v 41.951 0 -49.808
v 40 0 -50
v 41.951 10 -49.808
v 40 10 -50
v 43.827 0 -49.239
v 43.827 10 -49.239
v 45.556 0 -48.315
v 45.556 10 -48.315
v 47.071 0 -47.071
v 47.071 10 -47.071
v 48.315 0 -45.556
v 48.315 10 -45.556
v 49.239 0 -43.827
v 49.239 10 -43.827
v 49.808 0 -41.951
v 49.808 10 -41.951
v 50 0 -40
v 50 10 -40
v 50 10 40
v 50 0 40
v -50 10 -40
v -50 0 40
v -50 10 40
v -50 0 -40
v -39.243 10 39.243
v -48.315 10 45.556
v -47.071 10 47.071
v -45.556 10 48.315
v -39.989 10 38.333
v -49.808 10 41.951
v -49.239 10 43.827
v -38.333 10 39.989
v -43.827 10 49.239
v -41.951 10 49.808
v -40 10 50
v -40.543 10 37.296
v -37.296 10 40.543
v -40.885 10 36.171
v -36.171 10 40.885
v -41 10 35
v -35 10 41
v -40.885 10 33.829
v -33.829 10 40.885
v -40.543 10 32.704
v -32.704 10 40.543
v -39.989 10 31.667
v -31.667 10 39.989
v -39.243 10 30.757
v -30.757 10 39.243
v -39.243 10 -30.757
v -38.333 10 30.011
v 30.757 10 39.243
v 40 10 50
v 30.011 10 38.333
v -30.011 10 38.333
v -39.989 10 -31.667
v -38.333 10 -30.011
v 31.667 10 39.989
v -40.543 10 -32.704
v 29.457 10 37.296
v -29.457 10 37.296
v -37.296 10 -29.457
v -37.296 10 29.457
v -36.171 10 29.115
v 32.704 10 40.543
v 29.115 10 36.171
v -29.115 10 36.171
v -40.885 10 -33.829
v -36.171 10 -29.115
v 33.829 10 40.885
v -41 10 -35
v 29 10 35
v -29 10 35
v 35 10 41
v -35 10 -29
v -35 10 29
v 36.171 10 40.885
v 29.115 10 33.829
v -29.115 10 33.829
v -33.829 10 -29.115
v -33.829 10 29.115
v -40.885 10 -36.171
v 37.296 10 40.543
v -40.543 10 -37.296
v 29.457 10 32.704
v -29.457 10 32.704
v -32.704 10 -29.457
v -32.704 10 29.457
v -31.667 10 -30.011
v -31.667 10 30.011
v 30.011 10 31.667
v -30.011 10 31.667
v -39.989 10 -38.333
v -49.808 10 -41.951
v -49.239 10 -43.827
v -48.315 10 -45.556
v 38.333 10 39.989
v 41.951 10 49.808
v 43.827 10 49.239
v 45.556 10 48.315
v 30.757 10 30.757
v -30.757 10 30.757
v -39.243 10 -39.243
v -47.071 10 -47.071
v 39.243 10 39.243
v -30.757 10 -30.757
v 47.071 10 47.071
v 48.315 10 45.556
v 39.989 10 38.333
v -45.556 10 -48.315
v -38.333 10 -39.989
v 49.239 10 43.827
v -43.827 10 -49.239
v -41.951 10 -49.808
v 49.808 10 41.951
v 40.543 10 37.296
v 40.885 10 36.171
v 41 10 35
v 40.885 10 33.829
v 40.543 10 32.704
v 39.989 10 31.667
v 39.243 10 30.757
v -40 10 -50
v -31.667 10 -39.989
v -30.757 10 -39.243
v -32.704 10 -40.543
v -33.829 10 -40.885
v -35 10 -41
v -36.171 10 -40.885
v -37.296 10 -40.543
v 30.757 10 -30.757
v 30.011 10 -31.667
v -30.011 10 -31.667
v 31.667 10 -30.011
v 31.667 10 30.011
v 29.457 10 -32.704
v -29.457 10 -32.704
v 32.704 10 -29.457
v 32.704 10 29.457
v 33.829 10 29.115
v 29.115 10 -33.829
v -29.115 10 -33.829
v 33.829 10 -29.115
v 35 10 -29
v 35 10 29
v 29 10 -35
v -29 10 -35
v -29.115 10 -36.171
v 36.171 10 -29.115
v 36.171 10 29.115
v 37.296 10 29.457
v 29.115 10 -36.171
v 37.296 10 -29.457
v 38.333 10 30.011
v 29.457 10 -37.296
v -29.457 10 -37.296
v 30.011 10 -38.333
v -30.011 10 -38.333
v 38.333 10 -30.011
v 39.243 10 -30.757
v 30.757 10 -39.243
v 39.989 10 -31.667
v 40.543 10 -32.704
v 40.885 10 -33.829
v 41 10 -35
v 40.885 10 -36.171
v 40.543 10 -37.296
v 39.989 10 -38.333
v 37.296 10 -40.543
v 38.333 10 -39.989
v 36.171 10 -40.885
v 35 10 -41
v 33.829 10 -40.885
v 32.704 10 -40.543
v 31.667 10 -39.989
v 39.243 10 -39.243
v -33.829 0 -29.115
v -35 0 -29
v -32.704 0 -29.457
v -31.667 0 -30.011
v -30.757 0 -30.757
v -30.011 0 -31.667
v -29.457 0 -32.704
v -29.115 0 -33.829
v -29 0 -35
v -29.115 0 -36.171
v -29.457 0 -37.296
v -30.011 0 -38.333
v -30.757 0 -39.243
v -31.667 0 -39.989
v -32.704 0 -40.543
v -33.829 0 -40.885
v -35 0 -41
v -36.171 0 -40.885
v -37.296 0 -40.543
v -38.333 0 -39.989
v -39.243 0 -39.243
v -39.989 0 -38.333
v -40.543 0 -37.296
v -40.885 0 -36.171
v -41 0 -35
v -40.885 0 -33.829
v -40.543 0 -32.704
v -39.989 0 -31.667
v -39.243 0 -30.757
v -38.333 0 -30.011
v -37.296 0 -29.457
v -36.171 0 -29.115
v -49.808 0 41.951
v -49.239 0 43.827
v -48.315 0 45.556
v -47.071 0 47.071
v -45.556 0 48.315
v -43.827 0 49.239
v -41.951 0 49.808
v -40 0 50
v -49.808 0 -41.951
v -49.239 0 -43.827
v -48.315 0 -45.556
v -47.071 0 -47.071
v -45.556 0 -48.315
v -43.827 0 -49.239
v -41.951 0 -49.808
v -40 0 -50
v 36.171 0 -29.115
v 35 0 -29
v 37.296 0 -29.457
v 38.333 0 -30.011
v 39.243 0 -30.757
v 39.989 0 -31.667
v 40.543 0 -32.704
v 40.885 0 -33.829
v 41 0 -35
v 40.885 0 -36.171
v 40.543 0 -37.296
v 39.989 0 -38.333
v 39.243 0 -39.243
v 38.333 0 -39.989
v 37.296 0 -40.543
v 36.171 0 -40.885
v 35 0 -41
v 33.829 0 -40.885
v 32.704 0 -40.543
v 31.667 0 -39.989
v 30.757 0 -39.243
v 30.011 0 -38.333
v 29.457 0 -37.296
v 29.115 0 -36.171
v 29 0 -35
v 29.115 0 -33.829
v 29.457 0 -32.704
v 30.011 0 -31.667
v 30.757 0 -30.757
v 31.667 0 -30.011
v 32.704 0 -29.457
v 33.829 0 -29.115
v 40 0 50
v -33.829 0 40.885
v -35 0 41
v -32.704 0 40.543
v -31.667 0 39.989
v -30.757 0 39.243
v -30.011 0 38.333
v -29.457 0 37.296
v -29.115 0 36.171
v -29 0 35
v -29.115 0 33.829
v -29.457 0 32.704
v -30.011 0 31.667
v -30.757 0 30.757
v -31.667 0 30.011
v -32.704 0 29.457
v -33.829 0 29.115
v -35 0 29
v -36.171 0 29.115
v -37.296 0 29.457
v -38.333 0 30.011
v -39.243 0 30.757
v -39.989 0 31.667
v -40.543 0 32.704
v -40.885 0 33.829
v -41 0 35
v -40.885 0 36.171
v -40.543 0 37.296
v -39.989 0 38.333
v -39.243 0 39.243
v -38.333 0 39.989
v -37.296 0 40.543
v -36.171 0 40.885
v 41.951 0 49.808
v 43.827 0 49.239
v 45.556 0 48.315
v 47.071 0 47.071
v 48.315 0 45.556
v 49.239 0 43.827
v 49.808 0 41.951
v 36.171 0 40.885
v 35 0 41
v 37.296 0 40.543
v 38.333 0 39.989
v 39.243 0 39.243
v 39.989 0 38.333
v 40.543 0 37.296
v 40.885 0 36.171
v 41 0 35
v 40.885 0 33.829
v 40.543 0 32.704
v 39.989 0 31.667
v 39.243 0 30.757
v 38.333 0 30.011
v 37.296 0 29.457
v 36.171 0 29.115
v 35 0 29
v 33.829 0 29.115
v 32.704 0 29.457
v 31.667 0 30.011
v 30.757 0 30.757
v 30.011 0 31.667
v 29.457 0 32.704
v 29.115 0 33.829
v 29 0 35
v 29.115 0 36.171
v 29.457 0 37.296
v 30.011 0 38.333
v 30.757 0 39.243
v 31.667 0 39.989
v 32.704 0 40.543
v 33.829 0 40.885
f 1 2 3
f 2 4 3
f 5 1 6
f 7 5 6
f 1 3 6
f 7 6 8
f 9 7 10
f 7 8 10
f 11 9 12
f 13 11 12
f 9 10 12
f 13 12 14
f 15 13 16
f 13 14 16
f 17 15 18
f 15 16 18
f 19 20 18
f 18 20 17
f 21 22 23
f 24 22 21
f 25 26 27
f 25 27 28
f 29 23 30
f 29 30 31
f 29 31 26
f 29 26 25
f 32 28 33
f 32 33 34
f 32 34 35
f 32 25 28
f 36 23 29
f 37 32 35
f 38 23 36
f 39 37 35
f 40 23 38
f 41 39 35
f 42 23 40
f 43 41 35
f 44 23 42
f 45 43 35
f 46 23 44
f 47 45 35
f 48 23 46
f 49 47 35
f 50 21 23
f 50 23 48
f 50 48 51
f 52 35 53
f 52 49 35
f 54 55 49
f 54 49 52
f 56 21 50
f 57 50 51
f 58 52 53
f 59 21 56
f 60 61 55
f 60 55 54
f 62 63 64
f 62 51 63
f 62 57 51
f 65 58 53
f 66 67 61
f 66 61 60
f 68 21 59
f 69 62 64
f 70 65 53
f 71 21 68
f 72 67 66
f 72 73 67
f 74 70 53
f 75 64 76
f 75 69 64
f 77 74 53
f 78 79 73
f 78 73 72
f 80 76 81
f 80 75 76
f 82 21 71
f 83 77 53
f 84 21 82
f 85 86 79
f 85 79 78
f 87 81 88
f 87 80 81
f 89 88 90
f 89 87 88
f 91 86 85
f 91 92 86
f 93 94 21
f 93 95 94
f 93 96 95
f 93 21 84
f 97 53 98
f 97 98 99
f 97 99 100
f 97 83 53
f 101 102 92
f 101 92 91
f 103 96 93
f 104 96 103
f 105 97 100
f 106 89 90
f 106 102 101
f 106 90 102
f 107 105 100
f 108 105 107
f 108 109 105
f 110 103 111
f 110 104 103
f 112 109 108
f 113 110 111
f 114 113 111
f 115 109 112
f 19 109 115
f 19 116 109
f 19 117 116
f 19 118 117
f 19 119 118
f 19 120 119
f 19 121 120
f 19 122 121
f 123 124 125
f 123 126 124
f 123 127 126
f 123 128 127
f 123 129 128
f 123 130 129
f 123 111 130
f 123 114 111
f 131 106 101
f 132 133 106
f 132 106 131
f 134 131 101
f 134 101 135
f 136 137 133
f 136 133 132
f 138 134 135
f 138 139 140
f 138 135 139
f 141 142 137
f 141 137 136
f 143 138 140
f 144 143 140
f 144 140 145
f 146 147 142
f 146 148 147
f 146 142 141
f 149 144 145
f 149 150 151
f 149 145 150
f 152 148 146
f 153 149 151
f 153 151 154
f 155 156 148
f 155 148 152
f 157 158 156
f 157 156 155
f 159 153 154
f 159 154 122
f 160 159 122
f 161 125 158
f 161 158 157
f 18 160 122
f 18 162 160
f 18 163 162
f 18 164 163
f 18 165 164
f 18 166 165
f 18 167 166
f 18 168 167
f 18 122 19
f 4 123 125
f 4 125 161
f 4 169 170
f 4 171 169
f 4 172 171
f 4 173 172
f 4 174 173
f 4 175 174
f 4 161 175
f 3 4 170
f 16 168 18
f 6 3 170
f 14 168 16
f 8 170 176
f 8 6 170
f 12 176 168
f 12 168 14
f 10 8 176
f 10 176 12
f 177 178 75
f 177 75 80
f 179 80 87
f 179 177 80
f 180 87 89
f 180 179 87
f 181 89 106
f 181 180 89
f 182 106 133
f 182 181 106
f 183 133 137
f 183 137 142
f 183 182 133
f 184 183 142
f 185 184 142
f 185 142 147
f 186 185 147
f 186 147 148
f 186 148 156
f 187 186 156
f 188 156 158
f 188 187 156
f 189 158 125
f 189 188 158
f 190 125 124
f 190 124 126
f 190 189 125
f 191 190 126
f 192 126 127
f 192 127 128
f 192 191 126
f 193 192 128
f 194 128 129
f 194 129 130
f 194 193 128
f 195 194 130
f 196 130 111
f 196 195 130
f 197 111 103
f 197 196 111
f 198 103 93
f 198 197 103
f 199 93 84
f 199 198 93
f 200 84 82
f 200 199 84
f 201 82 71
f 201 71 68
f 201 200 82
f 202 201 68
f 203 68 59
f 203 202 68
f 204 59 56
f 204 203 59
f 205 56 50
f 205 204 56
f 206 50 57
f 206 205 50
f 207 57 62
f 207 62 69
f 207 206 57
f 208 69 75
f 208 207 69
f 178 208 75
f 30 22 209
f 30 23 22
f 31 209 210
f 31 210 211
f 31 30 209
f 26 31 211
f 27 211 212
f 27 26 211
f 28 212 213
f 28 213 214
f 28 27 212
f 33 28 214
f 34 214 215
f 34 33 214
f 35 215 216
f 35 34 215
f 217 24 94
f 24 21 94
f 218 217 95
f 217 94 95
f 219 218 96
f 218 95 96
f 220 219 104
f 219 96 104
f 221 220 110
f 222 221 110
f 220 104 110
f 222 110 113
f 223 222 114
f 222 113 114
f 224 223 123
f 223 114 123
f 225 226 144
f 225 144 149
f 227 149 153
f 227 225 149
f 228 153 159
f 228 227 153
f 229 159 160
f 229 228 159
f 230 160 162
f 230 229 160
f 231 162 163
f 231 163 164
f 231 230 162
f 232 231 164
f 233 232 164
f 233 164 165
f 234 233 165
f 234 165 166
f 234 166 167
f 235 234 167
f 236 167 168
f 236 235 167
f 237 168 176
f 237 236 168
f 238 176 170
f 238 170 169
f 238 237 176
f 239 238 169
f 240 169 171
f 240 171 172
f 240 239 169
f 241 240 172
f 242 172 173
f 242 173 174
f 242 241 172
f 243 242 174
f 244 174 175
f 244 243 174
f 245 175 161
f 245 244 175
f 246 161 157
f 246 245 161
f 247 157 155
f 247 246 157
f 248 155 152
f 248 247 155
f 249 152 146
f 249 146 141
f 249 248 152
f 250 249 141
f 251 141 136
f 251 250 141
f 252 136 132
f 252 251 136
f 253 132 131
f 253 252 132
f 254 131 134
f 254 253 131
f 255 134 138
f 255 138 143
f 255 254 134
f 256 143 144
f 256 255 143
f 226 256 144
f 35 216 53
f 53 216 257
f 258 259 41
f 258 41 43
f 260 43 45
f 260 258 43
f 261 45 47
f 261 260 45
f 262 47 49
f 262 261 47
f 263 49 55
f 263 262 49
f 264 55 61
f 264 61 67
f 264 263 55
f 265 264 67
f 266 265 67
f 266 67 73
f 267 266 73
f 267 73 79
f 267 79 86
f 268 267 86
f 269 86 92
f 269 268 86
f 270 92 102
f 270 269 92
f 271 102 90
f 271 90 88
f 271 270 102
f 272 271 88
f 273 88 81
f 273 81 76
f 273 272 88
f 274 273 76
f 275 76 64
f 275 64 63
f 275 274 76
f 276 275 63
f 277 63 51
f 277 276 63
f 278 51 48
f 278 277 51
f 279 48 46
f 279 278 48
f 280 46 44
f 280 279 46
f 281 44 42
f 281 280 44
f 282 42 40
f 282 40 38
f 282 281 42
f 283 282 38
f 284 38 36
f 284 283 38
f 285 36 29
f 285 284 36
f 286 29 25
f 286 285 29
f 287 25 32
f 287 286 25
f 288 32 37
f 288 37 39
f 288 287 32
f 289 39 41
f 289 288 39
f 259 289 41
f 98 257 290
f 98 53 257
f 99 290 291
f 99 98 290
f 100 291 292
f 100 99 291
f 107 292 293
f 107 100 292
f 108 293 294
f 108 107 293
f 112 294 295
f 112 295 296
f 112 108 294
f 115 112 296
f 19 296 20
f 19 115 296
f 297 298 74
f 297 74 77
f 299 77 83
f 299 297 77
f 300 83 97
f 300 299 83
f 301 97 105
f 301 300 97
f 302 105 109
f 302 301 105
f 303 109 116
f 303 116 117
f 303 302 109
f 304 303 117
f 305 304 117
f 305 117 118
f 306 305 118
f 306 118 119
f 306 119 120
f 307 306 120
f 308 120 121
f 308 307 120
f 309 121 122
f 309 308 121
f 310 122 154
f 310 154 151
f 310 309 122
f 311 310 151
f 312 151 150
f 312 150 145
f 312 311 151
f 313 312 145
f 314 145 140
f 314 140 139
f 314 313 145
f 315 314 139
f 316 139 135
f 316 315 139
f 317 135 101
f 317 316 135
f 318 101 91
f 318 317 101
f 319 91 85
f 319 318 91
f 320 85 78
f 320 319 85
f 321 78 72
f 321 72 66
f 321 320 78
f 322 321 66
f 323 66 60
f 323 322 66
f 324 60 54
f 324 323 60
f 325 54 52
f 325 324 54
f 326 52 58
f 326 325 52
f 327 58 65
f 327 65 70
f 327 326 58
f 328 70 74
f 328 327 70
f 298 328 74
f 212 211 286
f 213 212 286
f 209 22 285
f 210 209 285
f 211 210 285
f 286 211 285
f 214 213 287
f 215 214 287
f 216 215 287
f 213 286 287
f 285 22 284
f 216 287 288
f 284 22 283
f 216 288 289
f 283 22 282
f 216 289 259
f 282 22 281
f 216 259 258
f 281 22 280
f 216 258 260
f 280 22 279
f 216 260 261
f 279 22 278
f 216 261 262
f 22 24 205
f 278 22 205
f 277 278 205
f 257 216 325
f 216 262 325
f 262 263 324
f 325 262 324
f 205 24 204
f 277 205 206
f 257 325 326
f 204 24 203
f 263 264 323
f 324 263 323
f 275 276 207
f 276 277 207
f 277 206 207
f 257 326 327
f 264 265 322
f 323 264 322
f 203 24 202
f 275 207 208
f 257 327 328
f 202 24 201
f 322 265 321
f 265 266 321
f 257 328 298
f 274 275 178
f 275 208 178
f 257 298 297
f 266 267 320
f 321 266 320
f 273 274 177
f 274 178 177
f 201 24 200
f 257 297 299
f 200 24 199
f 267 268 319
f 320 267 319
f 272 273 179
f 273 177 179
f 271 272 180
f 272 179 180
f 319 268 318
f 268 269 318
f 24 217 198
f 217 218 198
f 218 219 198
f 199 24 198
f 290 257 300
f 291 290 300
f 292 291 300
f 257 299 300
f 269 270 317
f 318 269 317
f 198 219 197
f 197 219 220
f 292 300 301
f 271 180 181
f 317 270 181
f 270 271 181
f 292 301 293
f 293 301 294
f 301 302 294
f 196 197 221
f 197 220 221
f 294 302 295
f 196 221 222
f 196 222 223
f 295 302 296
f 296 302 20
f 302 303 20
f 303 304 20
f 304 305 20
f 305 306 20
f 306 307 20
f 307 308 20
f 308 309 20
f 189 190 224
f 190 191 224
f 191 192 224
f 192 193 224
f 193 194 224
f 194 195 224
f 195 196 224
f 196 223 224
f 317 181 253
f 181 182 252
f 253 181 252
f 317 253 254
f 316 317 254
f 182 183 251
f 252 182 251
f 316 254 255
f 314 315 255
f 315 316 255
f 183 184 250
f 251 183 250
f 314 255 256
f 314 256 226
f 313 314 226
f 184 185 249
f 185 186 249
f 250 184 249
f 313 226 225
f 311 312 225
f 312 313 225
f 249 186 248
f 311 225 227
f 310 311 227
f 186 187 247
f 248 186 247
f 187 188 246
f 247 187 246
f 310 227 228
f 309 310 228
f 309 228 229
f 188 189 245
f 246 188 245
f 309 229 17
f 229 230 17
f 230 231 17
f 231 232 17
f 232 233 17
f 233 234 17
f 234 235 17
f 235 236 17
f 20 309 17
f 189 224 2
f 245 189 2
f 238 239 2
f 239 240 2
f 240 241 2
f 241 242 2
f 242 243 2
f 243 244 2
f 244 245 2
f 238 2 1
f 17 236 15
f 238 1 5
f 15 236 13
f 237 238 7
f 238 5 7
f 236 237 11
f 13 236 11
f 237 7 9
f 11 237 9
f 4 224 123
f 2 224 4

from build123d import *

# Parameters (mm, degrees)
SCHIZZO1_W                   = 100
SCHIZZO1_H                   = 100
SCHIZZO1_R                   = 6
ESTRUSIONE_ESTRUSIONE1_DEPTH = 10
RACCORDO1_R                  = 10


with BuildPart() as part:
    # Schizzo1 → Estrusione-Estrusione1 (new body)
    with BuildSketch(Plane(origin=(0, 0, 0), x_dir=(1, 0, 0), z_dir=(0, 1, 0))):
        Rectangle(SCHIZZO1_W, SCHIZZO1_H)
        with Locations(Location((-35, 35, 0), (0, 0, 270))):
            Circle(SCHIZZO1_R, mode=Mode.SUBTRACT)
        with Locations(Location((35, 35, 0), (0, 0, 270))):
            Circle(SCHIZZO1_R, mode=Mode.SUBTRACT)
        with Locations(Location((-35, -35, 0), (0, 0, 270))):
            Circle(SCHIZZO1_R, mode=Mode.SUBTRACT)
        with Locations(Location((35, -35, 0), (0, 0, 270))):
            Circle(SCHIZZO1_R, mode=Mode.SUBTRACT)
    extrude(amount=ESTRUSIONE_ESTRUSIONE1_DEPTH)

    # Raccordo1
    raccordo1_edges = [part.edges().sort_by_distance(p)[0] for p in [
        (-50, 5, -50),
        (50, 5, -50),
        (50, 5, 50),
        (-50, 5, 50),
    ]]
    fillet(raccordo1_edges, radius=RACCORDO1_R)


solid = part.part
